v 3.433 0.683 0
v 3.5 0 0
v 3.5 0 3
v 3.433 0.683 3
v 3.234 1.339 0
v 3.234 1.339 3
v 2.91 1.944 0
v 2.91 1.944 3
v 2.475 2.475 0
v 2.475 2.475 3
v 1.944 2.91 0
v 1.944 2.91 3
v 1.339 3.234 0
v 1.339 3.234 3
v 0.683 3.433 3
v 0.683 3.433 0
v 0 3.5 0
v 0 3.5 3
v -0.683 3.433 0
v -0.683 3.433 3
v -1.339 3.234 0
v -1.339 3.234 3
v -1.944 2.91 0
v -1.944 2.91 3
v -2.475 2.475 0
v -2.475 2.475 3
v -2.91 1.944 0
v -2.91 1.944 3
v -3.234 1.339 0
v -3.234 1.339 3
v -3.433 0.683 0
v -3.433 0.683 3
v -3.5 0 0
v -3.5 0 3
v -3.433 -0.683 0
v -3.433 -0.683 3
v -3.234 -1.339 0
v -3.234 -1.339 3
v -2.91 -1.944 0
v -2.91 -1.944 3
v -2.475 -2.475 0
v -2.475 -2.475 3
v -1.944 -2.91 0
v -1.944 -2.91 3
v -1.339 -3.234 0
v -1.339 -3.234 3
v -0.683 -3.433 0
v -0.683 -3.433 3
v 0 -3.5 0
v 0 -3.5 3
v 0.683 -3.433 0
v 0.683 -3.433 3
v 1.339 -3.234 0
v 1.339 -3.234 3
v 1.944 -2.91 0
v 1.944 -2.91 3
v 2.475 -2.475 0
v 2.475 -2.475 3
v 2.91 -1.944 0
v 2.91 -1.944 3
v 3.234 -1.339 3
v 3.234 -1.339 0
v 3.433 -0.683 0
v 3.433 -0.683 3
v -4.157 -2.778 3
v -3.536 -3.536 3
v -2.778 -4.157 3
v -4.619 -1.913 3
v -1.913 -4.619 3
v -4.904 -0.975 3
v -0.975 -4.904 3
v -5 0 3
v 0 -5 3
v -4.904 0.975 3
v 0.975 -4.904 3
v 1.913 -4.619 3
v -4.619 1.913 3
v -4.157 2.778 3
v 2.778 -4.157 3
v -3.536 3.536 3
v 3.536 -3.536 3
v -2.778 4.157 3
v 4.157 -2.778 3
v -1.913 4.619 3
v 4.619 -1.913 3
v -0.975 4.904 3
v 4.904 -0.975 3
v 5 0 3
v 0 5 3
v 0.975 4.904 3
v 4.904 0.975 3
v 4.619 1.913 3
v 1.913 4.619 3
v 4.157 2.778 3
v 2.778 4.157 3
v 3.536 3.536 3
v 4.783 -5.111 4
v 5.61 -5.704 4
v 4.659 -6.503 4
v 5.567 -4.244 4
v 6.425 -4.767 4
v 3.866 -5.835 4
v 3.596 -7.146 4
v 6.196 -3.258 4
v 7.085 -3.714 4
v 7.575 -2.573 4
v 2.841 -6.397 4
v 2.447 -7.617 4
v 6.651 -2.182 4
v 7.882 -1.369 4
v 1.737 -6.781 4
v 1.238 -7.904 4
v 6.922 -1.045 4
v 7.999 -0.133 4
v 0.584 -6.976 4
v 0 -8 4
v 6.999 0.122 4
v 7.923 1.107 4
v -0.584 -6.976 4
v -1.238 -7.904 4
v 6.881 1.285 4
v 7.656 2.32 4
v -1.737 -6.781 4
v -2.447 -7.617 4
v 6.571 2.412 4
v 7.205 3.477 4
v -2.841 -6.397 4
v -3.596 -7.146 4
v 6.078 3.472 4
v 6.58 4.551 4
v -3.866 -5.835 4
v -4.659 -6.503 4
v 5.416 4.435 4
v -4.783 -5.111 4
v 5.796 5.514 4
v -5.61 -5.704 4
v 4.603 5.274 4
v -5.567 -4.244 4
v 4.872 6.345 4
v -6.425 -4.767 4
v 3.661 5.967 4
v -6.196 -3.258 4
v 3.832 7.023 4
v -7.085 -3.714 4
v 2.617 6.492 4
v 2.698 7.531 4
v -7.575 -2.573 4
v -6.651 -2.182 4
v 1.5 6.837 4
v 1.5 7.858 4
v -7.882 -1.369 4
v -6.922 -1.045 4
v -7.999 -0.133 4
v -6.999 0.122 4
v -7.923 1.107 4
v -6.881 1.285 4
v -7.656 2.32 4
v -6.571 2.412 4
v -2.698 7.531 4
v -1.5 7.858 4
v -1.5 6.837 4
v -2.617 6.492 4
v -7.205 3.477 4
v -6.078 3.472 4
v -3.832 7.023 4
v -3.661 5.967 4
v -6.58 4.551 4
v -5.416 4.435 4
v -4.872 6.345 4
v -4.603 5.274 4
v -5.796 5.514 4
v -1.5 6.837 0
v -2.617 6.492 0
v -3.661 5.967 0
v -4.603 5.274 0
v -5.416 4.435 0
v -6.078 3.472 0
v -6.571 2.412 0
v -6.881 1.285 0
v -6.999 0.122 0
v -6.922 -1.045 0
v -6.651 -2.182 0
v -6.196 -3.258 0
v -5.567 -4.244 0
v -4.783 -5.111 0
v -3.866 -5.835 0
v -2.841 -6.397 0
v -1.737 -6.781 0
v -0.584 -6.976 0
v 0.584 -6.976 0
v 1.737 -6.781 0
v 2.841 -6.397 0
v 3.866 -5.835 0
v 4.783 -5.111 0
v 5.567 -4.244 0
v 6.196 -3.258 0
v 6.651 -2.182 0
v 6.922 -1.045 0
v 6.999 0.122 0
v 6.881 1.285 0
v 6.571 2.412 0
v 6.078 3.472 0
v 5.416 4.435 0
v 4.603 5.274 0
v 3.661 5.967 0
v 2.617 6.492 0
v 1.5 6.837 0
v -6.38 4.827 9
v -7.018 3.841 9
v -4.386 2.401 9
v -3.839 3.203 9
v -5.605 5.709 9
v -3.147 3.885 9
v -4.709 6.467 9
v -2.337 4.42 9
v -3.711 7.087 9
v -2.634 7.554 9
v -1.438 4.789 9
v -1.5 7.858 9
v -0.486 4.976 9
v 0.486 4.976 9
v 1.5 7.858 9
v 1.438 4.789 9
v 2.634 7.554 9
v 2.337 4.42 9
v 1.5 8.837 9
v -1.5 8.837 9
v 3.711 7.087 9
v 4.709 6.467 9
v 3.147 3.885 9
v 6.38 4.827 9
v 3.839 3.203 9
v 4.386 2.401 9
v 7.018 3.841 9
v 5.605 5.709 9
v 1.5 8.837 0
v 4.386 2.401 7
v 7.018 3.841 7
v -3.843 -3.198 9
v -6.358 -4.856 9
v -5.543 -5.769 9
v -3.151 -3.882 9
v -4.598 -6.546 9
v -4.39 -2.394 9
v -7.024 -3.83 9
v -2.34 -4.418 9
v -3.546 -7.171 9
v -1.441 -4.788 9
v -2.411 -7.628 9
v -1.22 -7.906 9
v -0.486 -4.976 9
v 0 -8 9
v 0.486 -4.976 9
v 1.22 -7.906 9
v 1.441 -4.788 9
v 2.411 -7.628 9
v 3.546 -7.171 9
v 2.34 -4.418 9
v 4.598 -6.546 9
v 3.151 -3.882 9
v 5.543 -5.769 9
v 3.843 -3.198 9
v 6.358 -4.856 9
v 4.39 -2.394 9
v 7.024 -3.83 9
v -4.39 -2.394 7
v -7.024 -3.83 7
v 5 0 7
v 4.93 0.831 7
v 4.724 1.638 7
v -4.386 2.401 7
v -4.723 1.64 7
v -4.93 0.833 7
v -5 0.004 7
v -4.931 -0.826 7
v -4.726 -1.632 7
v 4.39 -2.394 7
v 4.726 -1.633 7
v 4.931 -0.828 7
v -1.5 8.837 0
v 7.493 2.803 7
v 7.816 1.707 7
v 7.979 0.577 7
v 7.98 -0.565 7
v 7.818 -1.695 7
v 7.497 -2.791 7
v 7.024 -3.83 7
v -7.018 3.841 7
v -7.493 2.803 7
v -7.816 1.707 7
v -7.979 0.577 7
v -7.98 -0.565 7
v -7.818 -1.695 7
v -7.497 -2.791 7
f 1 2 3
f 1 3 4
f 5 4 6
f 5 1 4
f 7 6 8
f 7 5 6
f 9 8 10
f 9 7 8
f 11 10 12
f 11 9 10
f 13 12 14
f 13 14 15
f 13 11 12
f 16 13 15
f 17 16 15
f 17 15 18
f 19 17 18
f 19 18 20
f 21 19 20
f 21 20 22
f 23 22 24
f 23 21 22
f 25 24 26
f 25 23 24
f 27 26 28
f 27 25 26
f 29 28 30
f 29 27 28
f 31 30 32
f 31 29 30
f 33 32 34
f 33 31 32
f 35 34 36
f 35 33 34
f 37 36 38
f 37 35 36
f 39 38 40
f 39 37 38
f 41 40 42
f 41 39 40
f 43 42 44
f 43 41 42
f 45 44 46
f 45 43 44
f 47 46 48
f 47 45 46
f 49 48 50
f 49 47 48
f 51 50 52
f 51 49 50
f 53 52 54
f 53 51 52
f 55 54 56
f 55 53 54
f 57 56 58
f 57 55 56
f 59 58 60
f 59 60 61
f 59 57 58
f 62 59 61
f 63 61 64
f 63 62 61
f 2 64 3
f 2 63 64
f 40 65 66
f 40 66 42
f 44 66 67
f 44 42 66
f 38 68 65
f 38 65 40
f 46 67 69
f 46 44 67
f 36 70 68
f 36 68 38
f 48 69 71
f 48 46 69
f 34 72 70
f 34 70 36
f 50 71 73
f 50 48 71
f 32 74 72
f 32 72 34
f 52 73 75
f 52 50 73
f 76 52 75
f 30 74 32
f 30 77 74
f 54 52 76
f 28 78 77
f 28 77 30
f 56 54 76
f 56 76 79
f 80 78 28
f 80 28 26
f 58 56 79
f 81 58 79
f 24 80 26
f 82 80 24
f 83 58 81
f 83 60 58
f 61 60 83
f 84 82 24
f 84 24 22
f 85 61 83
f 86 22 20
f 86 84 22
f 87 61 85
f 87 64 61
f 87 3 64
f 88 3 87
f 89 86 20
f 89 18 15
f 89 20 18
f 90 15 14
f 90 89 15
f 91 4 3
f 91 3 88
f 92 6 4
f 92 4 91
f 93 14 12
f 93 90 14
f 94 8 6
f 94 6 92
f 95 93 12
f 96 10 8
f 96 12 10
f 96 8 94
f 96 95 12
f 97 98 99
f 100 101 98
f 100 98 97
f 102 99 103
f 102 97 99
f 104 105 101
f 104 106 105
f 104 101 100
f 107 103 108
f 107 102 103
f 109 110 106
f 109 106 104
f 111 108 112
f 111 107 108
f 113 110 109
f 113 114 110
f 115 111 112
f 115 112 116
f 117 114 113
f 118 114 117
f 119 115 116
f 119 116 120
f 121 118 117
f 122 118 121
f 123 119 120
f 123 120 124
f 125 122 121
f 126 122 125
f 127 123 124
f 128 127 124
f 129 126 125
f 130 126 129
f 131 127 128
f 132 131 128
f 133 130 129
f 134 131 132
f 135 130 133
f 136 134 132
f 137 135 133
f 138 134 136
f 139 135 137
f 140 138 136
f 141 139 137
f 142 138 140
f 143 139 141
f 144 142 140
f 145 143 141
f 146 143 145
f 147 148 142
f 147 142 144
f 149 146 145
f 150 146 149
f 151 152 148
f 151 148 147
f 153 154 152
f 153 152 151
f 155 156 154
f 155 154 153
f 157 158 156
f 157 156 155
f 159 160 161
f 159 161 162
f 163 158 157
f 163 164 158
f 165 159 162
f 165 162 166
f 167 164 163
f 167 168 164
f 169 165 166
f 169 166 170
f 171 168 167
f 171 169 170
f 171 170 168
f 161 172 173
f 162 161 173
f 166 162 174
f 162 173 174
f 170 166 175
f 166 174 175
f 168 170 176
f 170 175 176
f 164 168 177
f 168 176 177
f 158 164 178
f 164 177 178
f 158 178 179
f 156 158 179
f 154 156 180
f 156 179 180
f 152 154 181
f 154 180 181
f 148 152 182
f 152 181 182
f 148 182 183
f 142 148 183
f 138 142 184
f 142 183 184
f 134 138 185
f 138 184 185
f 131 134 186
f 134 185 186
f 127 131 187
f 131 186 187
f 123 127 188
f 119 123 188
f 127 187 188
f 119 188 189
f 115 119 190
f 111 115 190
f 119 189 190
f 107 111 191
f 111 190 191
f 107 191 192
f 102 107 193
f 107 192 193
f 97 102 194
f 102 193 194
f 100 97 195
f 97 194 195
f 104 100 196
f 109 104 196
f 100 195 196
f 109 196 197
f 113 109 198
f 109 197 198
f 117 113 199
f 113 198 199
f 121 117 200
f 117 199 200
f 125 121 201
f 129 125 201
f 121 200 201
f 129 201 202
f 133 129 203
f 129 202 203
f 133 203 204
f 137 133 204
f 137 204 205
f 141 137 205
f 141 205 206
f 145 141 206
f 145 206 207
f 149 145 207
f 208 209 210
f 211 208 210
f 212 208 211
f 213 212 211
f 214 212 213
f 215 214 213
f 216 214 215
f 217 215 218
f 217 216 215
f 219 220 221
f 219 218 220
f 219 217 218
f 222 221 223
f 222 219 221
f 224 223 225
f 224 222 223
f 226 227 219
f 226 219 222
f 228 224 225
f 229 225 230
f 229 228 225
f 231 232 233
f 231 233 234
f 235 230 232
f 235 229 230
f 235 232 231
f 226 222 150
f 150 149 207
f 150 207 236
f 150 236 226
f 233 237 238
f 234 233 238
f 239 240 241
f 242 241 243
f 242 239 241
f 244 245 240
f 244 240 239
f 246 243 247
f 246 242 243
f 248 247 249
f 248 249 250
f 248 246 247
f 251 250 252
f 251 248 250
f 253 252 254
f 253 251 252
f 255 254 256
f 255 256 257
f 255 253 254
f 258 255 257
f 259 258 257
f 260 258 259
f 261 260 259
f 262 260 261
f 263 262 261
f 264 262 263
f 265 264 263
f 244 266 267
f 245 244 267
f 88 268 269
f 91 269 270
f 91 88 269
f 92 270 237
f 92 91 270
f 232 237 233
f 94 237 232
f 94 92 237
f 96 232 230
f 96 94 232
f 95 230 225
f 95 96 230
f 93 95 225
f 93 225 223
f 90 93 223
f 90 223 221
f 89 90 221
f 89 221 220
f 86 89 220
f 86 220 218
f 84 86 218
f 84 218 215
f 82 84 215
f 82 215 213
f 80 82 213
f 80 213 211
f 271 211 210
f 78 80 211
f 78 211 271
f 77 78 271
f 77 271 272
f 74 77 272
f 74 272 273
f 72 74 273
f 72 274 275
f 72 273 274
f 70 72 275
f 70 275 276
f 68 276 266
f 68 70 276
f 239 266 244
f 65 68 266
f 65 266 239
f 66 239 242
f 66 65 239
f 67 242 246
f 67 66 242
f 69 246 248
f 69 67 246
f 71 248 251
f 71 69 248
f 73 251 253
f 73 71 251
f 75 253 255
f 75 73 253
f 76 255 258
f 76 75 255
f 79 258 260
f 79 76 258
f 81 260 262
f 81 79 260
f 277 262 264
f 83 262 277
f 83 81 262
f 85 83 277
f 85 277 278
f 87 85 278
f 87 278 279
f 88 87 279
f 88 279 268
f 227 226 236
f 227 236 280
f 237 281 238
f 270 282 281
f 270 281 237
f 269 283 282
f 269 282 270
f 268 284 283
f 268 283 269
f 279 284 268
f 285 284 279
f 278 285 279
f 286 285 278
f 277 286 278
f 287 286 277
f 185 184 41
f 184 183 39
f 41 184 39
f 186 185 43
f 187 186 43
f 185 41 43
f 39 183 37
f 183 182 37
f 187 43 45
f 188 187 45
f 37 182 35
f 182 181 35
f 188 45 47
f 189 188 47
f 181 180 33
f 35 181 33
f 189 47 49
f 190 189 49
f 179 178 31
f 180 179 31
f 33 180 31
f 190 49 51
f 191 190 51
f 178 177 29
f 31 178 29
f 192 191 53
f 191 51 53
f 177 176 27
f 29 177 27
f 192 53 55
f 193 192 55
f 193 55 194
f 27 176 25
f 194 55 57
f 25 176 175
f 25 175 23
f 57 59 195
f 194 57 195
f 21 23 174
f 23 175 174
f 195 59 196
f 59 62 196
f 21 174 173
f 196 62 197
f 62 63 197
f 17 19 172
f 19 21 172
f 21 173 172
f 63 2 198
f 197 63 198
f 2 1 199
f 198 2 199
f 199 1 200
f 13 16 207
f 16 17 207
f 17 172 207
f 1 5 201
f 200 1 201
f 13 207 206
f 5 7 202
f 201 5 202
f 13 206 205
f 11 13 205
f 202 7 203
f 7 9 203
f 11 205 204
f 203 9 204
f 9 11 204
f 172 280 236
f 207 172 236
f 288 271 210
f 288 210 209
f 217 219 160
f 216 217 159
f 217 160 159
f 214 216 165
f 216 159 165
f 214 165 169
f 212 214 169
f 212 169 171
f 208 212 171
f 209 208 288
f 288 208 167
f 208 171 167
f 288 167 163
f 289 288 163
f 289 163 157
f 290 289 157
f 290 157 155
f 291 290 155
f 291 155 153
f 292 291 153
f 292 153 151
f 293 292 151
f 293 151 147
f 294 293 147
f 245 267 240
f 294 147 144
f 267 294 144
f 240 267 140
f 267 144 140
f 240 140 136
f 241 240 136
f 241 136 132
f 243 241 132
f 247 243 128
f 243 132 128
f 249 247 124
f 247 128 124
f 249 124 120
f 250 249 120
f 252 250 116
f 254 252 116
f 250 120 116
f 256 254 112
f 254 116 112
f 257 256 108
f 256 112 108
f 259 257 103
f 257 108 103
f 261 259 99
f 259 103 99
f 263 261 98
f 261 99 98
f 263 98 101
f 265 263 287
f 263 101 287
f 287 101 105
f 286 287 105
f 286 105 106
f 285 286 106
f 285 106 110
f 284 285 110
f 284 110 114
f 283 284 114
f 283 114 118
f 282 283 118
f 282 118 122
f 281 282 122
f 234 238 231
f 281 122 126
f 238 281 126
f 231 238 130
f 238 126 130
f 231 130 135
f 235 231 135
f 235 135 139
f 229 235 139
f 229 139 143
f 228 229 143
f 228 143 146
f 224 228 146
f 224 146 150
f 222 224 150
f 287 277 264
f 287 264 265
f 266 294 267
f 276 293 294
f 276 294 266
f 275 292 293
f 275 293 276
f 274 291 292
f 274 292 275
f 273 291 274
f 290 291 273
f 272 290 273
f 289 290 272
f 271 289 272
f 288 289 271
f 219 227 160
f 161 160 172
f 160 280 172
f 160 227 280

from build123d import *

# Parameters (mm, degrees)
SKETCH1_R                = 8
SKETCH1_R_2              = 3.5
BOSS_EXTRUDE1_DEPTH      = 3
SKETCH2_R                = 8
SKETCH2_R_2              = 5
BOSS_EXTRUDE2_DEPTH      = 6
WRAP3_SECTION_W          = 4
WRAP3_SECTION_H          = 2
WRAP3_ANGLE              = 57.295779513
WRAP3_SECTOR_2_SECTION_W = 4
WRAP3_SECTOR_2_SECTION_H = 2
WRAP3_SECTOR_2_ANGLE     = 57.295779513
CUT_EXTRUDE1_DEPTH       = 4
BOSS_EXTRUDE3_DEPTH      = 9


with BuildPart() as part:
    # Sketch1 → Boss-Extrude1 (new body)
    with BuildSketch(Plane.XY):
        Circle(SKETCH1_R)
        Circle(SKETCH1_R_2, mode=Mode.SUBTRACT)
    extrude(amount=BOSS_EXTRUDE1_DEPTH)

    # Sketch2 → Boss-Extrude2 (add)
    with BuildSketch(Plane.XY.offset(3)):
        Circle(SKETCH2_R)
        Circle(SKETCH2_R_2, mode=Mode.SUBTRACT)
    extrude(amount=BOSS_EXTRUDE2_DEPTH)

    # Wrap3 section (on wrap section) → Wrap3 (revolve, cut)
    with BuildSketch(Plane(origin=(0, 0, 0), x_dir=(-0.8779640629990781, -0.4787265441587198, 0), z_dir=(0.4787265441587198, -0.8779640629990781, 0))):
        with Locations((6, -8)):
            Rectangle(WRAP3_SECTION_W, WRAP3_SECTION_H)
    revolve(axis=Axis((0, 0, 0), (0, 0, -1)), revolution_arc=WRAP3_ANGLE, mode=Mode.SUBTRACT)

    # Wrap3 sector 2 section (on wrap section) → Wrap3 sector 2 (revolve, cut)
    with BuildSketch(Plane(origin=(0, 0, 0), x_dir=(0.8772005042746819, 0.4801242290285337, 0), z_dir=(-0.4801242290285337, 0.8772005042746819, 0))):
        with Locations((6, -8)):
            Rectangle(WRAP3_SECTOR_2_SECTION_W, WRAP3_SECTOR_2_SECTION_H)
    revolve(axis=Axis((0, 0, 0), (0, 0, -1)), revolution_arc=WRAP3_SECTOR_2_ANGLE, mode=Mode.SUBTRACT)

    # Sketch5 → Cut-Extrude1 (cut)
    with BuildSketch(Plane(origin=(0, 0, 0), x_dir=(-1, 0, 0), z_dir=(0, 0, -1))):
        with BuildLine():
            Line((-1.5, 6.837397166), (-1.5, 7.858116823))
            ThreePointArc((-1.5, 7.858116823), (0, -8), (1.5, 7.858116823))
            Line((1.5, 7.858116823), (1.5, 6.837397166))
            ThreePointArc((1.5, 6.837397166), (0, -7), (-1.5, 6.837397166))
        make_face()
    extrude(amount=-CUT_EXTRUDE1_DEPTH, mode=Mode.SUBTRACT)

    # Sketch6 → Boss-Extrude3 (add)
    with BuildSketch(Plane(origin=(0, 0, 0), x_dir=(-1, 0, 0), z_dir=(0, 0, -1))):
        with BuildLine():
            Line((-1.5, 7.858116823), (-1.5, 8.837397166))
            Line((-1.5, 8.837397166), (1.5, 8.837397166))
            Line((1.5, 8.837397166), (1.5, 7.858116823))
            ThreePointArc((1.5, 7.858116823), (0, 8), (-1.5, 7.858116823))
        make_face()
    extrude(amount=-BOSS_EXTRUDE3_DEPTH)


solid = part.part
